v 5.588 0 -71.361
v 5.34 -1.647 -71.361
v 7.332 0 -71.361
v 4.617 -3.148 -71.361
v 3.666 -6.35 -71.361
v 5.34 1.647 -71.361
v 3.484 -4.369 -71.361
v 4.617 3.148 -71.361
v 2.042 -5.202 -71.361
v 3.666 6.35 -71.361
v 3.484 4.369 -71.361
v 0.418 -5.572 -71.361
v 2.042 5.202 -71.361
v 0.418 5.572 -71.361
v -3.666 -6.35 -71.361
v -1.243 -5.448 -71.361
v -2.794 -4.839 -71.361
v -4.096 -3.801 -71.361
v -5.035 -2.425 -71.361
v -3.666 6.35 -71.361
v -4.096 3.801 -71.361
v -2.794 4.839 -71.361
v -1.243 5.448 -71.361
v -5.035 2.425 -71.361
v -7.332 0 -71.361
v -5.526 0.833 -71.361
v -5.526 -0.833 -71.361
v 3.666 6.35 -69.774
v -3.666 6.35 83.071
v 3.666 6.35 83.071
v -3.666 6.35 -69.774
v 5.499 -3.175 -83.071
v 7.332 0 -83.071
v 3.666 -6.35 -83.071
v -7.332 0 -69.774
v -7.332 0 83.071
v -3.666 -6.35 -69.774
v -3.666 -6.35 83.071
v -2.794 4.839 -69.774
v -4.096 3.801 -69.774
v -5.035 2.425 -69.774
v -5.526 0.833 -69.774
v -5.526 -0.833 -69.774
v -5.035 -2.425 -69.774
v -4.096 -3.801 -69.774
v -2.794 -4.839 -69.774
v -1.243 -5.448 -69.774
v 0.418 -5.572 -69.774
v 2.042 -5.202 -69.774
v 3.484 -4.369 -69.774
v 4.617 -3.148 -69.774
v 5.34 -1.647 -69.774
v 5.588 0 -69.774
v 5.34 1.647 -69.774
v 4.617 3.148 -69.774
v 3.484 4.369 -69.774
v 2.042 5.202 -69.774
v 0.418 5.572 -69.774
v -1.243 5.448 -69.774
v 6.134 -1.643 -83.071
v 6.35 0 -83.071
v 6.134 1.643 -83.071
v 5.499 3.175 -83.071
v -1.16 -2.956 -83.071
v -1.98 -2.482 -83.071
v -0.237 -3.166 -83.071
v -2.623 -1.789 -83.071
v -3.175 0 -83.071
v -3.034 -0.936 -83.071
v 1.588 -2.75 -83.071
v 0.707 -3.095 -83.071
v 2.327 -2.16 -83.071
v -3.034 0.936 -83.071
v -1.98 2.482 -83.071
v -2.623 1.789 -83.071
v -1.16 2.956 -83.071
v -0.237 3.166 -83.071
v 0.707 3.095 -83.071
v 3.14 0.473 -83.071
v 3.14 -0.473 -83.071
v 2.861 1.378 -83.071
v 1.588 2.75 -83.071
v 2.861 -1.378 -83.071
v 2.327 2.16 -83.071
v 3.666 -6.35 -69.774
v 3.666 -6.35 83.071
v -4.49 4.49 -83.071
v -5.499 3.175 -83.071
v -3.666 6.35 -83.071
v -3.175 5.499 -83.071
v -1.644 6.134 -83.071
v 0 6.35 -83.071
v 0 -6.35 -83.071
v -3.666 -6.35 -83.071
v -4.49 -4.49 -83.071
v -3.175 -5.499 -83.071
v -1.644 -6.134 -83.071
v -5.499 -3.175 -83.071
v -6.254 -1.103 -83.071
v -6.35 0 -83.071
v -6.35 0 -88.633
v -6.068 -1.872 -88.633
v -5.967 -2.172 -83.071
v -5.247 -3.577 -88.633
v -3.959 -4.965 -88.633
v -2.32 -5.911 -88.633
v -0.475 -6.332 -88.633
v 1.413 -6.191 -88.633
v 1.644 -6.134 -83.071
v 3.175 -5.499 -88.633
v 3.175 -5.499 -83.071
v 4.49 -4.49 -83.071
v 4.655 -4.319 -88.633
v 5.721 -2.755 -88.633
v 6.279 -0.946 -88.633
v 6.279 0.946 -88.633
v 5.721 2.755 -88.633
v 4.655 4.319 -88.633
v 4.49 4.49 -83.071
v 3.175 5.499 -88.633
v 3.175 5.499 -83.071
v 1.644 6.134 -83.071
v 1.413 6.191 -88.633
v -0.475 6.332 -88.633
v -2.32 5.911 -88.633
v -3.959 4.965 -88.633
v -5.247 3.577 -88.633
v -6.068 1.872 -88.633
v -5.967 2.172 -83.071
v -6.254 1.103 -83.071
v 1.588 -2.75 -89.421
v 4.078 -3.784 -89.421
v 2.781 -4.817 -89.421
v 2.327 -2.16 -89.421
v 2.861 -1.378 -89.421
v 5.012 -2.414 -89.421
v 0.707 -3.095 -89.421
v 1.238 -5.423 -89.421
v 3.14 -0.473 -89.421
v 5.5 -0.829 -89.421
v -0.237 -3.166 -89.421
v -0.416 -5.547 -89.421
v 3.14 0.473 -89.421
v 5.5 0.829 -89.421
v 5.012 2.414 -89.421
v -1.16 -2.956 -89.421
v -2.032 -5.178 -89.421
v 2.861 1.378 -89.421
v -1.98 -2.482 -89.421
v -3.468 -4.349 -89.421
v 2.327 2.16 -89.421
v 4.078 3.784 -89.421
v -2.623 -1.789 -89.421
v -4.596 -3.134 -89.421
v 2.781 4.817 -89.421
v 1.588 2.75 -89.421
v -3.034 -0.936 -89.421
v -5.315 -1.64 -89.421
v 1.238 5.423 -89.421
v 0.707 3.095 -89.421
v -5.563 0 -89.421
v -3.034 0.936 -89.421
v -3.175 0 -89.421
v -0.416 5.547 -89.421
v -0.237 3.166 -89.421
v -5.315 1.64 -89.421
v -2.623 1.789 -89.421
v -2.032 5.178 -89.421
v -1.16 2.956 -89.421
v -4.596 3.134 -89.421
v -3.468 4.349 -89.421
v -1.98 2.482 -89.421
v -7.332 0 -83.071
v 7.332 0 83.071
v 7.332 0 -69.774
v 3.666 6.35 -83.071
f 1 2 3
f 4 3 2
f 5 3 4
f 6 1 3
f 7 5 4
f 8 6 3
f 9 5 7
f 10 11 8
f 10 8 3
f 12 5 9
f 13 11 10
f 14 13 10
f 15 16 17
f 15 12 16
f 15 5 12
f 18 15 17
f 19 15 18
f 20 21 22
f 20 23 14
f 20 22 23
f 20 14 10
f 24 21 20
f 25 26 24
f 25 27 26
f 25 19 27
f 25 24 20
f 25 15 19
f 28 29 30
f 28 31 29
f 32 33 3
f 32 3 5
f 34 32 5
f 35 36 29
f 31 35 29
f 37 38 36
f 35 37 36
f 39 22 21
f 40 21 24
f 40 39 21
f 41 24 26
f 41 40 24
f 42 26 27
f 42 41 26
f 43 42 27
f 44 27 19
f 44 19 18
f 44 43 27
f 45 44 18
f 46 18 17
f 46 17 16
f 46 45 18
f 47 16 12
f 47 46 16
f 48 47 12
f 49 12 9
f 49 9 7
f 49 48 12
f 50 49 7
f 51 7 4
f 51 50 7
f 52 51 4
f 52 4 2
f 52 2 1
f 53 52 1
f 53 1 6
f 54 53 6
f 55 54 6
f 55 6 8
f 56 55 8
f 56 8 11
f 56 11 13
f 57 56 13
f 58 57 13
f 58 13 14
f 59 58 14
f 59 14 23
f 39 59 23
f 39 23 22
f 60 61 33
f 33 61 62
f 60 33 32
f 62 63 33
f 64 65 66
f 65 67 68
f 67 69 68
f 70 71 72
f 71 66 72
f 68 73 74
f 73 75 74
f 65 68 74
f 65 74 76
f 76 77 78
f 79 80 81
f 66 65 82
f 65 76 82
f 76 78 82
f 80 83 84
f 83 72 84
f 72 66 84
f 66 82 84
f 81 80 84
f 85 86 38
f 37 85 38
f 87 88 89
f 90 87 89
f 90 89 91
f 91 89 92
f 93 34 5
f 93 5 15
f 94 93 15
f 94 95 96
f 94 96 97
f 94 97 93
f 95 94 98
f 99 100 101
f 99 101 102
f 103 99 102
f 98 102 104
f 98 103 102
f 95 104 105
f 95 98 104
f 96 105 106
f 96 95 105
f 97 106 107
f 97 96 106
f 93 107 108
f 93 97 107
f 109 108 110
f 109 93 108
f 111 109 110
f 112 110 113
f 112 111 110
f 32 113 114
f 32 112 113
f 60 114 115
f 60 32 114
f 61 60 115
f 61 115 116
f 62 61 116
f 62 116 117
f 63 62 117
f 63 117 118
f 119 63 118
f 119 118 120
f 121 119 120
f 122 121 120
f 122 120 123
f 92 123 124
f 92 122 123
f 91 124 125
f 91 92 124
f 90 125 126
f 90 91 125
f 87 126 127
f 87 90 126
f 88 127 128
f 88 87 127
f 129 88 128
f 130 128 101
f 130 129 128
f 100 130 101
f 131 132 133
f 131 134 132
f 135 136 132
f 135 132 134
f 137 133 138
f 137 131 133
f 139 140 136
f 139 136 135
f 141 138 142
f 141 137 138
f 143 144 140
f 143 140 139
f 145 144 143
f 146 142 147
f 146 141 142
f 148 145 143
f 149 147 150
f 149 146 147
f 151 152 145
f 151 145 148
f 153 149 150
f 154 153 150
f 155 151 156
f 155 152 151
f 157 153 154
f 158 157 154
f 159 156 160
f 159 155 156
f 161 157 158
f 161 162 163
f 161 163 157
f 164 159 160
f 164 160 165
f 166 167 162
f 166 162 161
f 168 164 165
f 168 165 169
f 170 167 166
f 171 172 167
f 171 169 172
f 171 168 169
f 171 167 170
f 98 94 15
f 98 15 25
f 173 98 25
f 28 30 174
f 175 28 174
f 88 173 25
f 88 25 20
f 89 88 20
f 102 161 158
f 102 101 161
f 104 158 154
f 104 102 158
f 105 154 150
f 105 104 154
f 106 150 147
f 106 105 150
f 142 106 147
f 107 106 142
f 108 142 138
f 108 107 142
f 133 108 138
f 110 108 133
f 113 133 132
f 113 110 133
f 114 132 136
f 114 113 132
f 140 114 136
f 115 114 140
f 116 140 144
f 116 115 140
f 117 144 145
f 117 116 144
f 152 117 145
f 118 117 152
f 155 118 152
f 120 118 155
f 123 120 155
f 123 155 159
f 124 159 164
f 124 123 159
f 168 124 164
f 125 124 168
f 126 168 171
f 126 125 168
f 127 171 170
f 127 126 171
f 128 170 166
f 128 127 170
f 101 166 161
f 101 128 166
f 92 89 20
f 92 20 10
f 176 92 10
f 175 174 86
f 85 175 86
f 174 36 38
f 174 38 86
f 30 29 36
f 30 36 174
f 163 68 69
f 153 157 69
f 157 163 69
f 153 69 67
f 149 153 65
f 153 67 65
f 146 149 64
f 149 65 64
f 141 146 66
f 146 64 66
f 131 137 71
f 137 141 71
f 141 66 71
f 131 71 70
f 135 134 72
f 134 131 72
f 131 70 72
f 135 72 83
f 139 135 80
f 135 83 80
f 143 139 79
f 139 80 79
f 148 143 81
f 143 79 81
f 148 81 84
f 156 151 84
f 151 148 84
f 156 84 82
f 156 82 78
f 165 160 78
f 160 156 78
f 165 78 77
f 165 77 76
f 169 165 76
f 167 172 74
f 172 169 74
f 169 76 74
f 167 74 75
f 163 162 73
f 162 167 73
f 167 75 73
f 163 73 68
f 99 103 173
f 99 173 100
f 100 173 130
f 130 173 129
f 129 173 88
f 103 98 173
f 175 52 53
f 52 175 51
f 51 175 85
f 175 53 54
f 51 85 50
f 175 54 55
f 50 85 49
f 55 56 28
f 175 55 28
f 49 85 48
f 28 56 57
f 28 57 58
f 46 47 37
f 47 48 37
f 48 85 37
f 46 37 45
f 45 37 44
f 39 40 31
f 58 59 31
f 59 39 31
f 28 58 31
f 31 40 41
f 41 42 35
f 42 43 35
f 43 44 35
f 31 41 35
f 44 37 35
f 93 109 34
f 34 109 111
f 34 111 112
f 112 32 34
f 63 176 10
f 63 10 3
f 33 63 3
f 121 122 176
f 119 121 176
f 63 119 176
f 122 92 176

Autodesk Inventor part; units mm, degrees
ref_plane "YZ Plane" through (0, 0, 0) normal (1, 0, 0) x (0, 1, 0)
ref_plane "XZ Plane" through (0, 0, 0) normal (0, 1, 0) x (-1, 0, 0)
sketch "Sketch1" plane through (0, 0, 0) normal (0, 0, 1) x (1, 0, 0)
  line L0 (-3.6662, 6.35) -> (3.6662, 6.35)
  line L1 (3.6662, 6.35) -> (7.3323, 0)
  line L2 (7.3323, 0) -> (3.6662, -6.35)
  line L3 (3.6662, -6.35) -> (-3.6662, -6.35)
  line L4 (-3.6662, -6.35) -> (-7.3323, 0)
  line L5 (-7.3323, 0) -> (-3.6662, 6.35)
  point P0 (0, 0)
  point P1 (0, 0)
  dimension "d0" = 7.3323
extrude "Extrusion1" add sketch "Sketch1" along normal mid plane 166.1414
sketch "Sketch2" plane through (0, 0, -83.0707) normal (0, 0, -1) x (-1, 0, 0)
  circle A0 centre (0, 0) radius 3.175
  circle A1 centre (0, 0) radius 6.35
  dimension "d3" = 6.35
  dimension "d4" = 12.7
extrude "Extrusion2" add sketch "Sketch2" along normal blind 6.35
chamfer "Chamfer1" distance 0.7874 angle 45 1 edges at (6.35, 0, -89.4207)
ref_plane "Work Plane1" through (-1.8331, 3.175, 83.0707) normal (0.866, 0.5, 0) x (0, 0, -1)
sketch "Sketch3" plane through (-1.8331, 3.175, 83.0707) normal (0.866, 0.5, 0) x (0, 0, -1)
  line L0 (166.1414, -3.6662) -> (166.1414, 0) projected
  line L1 (154.432, 1.9218) -> (154.432, 5.7318)
  line L2 (152.8445, 1.9218) -> (152.8445, 5.7318)
  line L3 (154.432, 1.9218) -> (159.062, 1.9218) construction
  line L4 (166.1414, -3.6662) -> (163.6991, -3.6662)
  line L5 (154.432, 5.7318) -> (152.8445, 5.7318)
  line L6 (154.432, 1.9218) -> (152.8445, 1.9218)
  point P0 (83.0707, -3.6662)
  dimension "d10" = 11.7094
  dimension "d11" = 1.5875
  dimension "d12" = 5.588
  dimension "d13" = 3.81
revolve "Revolution1" cut sketch "Sketch3" angle 360 about axis through (0, 0, -83.0707) along (0, 0, 1)
properties part number "Gearbox_hex_shaft"
